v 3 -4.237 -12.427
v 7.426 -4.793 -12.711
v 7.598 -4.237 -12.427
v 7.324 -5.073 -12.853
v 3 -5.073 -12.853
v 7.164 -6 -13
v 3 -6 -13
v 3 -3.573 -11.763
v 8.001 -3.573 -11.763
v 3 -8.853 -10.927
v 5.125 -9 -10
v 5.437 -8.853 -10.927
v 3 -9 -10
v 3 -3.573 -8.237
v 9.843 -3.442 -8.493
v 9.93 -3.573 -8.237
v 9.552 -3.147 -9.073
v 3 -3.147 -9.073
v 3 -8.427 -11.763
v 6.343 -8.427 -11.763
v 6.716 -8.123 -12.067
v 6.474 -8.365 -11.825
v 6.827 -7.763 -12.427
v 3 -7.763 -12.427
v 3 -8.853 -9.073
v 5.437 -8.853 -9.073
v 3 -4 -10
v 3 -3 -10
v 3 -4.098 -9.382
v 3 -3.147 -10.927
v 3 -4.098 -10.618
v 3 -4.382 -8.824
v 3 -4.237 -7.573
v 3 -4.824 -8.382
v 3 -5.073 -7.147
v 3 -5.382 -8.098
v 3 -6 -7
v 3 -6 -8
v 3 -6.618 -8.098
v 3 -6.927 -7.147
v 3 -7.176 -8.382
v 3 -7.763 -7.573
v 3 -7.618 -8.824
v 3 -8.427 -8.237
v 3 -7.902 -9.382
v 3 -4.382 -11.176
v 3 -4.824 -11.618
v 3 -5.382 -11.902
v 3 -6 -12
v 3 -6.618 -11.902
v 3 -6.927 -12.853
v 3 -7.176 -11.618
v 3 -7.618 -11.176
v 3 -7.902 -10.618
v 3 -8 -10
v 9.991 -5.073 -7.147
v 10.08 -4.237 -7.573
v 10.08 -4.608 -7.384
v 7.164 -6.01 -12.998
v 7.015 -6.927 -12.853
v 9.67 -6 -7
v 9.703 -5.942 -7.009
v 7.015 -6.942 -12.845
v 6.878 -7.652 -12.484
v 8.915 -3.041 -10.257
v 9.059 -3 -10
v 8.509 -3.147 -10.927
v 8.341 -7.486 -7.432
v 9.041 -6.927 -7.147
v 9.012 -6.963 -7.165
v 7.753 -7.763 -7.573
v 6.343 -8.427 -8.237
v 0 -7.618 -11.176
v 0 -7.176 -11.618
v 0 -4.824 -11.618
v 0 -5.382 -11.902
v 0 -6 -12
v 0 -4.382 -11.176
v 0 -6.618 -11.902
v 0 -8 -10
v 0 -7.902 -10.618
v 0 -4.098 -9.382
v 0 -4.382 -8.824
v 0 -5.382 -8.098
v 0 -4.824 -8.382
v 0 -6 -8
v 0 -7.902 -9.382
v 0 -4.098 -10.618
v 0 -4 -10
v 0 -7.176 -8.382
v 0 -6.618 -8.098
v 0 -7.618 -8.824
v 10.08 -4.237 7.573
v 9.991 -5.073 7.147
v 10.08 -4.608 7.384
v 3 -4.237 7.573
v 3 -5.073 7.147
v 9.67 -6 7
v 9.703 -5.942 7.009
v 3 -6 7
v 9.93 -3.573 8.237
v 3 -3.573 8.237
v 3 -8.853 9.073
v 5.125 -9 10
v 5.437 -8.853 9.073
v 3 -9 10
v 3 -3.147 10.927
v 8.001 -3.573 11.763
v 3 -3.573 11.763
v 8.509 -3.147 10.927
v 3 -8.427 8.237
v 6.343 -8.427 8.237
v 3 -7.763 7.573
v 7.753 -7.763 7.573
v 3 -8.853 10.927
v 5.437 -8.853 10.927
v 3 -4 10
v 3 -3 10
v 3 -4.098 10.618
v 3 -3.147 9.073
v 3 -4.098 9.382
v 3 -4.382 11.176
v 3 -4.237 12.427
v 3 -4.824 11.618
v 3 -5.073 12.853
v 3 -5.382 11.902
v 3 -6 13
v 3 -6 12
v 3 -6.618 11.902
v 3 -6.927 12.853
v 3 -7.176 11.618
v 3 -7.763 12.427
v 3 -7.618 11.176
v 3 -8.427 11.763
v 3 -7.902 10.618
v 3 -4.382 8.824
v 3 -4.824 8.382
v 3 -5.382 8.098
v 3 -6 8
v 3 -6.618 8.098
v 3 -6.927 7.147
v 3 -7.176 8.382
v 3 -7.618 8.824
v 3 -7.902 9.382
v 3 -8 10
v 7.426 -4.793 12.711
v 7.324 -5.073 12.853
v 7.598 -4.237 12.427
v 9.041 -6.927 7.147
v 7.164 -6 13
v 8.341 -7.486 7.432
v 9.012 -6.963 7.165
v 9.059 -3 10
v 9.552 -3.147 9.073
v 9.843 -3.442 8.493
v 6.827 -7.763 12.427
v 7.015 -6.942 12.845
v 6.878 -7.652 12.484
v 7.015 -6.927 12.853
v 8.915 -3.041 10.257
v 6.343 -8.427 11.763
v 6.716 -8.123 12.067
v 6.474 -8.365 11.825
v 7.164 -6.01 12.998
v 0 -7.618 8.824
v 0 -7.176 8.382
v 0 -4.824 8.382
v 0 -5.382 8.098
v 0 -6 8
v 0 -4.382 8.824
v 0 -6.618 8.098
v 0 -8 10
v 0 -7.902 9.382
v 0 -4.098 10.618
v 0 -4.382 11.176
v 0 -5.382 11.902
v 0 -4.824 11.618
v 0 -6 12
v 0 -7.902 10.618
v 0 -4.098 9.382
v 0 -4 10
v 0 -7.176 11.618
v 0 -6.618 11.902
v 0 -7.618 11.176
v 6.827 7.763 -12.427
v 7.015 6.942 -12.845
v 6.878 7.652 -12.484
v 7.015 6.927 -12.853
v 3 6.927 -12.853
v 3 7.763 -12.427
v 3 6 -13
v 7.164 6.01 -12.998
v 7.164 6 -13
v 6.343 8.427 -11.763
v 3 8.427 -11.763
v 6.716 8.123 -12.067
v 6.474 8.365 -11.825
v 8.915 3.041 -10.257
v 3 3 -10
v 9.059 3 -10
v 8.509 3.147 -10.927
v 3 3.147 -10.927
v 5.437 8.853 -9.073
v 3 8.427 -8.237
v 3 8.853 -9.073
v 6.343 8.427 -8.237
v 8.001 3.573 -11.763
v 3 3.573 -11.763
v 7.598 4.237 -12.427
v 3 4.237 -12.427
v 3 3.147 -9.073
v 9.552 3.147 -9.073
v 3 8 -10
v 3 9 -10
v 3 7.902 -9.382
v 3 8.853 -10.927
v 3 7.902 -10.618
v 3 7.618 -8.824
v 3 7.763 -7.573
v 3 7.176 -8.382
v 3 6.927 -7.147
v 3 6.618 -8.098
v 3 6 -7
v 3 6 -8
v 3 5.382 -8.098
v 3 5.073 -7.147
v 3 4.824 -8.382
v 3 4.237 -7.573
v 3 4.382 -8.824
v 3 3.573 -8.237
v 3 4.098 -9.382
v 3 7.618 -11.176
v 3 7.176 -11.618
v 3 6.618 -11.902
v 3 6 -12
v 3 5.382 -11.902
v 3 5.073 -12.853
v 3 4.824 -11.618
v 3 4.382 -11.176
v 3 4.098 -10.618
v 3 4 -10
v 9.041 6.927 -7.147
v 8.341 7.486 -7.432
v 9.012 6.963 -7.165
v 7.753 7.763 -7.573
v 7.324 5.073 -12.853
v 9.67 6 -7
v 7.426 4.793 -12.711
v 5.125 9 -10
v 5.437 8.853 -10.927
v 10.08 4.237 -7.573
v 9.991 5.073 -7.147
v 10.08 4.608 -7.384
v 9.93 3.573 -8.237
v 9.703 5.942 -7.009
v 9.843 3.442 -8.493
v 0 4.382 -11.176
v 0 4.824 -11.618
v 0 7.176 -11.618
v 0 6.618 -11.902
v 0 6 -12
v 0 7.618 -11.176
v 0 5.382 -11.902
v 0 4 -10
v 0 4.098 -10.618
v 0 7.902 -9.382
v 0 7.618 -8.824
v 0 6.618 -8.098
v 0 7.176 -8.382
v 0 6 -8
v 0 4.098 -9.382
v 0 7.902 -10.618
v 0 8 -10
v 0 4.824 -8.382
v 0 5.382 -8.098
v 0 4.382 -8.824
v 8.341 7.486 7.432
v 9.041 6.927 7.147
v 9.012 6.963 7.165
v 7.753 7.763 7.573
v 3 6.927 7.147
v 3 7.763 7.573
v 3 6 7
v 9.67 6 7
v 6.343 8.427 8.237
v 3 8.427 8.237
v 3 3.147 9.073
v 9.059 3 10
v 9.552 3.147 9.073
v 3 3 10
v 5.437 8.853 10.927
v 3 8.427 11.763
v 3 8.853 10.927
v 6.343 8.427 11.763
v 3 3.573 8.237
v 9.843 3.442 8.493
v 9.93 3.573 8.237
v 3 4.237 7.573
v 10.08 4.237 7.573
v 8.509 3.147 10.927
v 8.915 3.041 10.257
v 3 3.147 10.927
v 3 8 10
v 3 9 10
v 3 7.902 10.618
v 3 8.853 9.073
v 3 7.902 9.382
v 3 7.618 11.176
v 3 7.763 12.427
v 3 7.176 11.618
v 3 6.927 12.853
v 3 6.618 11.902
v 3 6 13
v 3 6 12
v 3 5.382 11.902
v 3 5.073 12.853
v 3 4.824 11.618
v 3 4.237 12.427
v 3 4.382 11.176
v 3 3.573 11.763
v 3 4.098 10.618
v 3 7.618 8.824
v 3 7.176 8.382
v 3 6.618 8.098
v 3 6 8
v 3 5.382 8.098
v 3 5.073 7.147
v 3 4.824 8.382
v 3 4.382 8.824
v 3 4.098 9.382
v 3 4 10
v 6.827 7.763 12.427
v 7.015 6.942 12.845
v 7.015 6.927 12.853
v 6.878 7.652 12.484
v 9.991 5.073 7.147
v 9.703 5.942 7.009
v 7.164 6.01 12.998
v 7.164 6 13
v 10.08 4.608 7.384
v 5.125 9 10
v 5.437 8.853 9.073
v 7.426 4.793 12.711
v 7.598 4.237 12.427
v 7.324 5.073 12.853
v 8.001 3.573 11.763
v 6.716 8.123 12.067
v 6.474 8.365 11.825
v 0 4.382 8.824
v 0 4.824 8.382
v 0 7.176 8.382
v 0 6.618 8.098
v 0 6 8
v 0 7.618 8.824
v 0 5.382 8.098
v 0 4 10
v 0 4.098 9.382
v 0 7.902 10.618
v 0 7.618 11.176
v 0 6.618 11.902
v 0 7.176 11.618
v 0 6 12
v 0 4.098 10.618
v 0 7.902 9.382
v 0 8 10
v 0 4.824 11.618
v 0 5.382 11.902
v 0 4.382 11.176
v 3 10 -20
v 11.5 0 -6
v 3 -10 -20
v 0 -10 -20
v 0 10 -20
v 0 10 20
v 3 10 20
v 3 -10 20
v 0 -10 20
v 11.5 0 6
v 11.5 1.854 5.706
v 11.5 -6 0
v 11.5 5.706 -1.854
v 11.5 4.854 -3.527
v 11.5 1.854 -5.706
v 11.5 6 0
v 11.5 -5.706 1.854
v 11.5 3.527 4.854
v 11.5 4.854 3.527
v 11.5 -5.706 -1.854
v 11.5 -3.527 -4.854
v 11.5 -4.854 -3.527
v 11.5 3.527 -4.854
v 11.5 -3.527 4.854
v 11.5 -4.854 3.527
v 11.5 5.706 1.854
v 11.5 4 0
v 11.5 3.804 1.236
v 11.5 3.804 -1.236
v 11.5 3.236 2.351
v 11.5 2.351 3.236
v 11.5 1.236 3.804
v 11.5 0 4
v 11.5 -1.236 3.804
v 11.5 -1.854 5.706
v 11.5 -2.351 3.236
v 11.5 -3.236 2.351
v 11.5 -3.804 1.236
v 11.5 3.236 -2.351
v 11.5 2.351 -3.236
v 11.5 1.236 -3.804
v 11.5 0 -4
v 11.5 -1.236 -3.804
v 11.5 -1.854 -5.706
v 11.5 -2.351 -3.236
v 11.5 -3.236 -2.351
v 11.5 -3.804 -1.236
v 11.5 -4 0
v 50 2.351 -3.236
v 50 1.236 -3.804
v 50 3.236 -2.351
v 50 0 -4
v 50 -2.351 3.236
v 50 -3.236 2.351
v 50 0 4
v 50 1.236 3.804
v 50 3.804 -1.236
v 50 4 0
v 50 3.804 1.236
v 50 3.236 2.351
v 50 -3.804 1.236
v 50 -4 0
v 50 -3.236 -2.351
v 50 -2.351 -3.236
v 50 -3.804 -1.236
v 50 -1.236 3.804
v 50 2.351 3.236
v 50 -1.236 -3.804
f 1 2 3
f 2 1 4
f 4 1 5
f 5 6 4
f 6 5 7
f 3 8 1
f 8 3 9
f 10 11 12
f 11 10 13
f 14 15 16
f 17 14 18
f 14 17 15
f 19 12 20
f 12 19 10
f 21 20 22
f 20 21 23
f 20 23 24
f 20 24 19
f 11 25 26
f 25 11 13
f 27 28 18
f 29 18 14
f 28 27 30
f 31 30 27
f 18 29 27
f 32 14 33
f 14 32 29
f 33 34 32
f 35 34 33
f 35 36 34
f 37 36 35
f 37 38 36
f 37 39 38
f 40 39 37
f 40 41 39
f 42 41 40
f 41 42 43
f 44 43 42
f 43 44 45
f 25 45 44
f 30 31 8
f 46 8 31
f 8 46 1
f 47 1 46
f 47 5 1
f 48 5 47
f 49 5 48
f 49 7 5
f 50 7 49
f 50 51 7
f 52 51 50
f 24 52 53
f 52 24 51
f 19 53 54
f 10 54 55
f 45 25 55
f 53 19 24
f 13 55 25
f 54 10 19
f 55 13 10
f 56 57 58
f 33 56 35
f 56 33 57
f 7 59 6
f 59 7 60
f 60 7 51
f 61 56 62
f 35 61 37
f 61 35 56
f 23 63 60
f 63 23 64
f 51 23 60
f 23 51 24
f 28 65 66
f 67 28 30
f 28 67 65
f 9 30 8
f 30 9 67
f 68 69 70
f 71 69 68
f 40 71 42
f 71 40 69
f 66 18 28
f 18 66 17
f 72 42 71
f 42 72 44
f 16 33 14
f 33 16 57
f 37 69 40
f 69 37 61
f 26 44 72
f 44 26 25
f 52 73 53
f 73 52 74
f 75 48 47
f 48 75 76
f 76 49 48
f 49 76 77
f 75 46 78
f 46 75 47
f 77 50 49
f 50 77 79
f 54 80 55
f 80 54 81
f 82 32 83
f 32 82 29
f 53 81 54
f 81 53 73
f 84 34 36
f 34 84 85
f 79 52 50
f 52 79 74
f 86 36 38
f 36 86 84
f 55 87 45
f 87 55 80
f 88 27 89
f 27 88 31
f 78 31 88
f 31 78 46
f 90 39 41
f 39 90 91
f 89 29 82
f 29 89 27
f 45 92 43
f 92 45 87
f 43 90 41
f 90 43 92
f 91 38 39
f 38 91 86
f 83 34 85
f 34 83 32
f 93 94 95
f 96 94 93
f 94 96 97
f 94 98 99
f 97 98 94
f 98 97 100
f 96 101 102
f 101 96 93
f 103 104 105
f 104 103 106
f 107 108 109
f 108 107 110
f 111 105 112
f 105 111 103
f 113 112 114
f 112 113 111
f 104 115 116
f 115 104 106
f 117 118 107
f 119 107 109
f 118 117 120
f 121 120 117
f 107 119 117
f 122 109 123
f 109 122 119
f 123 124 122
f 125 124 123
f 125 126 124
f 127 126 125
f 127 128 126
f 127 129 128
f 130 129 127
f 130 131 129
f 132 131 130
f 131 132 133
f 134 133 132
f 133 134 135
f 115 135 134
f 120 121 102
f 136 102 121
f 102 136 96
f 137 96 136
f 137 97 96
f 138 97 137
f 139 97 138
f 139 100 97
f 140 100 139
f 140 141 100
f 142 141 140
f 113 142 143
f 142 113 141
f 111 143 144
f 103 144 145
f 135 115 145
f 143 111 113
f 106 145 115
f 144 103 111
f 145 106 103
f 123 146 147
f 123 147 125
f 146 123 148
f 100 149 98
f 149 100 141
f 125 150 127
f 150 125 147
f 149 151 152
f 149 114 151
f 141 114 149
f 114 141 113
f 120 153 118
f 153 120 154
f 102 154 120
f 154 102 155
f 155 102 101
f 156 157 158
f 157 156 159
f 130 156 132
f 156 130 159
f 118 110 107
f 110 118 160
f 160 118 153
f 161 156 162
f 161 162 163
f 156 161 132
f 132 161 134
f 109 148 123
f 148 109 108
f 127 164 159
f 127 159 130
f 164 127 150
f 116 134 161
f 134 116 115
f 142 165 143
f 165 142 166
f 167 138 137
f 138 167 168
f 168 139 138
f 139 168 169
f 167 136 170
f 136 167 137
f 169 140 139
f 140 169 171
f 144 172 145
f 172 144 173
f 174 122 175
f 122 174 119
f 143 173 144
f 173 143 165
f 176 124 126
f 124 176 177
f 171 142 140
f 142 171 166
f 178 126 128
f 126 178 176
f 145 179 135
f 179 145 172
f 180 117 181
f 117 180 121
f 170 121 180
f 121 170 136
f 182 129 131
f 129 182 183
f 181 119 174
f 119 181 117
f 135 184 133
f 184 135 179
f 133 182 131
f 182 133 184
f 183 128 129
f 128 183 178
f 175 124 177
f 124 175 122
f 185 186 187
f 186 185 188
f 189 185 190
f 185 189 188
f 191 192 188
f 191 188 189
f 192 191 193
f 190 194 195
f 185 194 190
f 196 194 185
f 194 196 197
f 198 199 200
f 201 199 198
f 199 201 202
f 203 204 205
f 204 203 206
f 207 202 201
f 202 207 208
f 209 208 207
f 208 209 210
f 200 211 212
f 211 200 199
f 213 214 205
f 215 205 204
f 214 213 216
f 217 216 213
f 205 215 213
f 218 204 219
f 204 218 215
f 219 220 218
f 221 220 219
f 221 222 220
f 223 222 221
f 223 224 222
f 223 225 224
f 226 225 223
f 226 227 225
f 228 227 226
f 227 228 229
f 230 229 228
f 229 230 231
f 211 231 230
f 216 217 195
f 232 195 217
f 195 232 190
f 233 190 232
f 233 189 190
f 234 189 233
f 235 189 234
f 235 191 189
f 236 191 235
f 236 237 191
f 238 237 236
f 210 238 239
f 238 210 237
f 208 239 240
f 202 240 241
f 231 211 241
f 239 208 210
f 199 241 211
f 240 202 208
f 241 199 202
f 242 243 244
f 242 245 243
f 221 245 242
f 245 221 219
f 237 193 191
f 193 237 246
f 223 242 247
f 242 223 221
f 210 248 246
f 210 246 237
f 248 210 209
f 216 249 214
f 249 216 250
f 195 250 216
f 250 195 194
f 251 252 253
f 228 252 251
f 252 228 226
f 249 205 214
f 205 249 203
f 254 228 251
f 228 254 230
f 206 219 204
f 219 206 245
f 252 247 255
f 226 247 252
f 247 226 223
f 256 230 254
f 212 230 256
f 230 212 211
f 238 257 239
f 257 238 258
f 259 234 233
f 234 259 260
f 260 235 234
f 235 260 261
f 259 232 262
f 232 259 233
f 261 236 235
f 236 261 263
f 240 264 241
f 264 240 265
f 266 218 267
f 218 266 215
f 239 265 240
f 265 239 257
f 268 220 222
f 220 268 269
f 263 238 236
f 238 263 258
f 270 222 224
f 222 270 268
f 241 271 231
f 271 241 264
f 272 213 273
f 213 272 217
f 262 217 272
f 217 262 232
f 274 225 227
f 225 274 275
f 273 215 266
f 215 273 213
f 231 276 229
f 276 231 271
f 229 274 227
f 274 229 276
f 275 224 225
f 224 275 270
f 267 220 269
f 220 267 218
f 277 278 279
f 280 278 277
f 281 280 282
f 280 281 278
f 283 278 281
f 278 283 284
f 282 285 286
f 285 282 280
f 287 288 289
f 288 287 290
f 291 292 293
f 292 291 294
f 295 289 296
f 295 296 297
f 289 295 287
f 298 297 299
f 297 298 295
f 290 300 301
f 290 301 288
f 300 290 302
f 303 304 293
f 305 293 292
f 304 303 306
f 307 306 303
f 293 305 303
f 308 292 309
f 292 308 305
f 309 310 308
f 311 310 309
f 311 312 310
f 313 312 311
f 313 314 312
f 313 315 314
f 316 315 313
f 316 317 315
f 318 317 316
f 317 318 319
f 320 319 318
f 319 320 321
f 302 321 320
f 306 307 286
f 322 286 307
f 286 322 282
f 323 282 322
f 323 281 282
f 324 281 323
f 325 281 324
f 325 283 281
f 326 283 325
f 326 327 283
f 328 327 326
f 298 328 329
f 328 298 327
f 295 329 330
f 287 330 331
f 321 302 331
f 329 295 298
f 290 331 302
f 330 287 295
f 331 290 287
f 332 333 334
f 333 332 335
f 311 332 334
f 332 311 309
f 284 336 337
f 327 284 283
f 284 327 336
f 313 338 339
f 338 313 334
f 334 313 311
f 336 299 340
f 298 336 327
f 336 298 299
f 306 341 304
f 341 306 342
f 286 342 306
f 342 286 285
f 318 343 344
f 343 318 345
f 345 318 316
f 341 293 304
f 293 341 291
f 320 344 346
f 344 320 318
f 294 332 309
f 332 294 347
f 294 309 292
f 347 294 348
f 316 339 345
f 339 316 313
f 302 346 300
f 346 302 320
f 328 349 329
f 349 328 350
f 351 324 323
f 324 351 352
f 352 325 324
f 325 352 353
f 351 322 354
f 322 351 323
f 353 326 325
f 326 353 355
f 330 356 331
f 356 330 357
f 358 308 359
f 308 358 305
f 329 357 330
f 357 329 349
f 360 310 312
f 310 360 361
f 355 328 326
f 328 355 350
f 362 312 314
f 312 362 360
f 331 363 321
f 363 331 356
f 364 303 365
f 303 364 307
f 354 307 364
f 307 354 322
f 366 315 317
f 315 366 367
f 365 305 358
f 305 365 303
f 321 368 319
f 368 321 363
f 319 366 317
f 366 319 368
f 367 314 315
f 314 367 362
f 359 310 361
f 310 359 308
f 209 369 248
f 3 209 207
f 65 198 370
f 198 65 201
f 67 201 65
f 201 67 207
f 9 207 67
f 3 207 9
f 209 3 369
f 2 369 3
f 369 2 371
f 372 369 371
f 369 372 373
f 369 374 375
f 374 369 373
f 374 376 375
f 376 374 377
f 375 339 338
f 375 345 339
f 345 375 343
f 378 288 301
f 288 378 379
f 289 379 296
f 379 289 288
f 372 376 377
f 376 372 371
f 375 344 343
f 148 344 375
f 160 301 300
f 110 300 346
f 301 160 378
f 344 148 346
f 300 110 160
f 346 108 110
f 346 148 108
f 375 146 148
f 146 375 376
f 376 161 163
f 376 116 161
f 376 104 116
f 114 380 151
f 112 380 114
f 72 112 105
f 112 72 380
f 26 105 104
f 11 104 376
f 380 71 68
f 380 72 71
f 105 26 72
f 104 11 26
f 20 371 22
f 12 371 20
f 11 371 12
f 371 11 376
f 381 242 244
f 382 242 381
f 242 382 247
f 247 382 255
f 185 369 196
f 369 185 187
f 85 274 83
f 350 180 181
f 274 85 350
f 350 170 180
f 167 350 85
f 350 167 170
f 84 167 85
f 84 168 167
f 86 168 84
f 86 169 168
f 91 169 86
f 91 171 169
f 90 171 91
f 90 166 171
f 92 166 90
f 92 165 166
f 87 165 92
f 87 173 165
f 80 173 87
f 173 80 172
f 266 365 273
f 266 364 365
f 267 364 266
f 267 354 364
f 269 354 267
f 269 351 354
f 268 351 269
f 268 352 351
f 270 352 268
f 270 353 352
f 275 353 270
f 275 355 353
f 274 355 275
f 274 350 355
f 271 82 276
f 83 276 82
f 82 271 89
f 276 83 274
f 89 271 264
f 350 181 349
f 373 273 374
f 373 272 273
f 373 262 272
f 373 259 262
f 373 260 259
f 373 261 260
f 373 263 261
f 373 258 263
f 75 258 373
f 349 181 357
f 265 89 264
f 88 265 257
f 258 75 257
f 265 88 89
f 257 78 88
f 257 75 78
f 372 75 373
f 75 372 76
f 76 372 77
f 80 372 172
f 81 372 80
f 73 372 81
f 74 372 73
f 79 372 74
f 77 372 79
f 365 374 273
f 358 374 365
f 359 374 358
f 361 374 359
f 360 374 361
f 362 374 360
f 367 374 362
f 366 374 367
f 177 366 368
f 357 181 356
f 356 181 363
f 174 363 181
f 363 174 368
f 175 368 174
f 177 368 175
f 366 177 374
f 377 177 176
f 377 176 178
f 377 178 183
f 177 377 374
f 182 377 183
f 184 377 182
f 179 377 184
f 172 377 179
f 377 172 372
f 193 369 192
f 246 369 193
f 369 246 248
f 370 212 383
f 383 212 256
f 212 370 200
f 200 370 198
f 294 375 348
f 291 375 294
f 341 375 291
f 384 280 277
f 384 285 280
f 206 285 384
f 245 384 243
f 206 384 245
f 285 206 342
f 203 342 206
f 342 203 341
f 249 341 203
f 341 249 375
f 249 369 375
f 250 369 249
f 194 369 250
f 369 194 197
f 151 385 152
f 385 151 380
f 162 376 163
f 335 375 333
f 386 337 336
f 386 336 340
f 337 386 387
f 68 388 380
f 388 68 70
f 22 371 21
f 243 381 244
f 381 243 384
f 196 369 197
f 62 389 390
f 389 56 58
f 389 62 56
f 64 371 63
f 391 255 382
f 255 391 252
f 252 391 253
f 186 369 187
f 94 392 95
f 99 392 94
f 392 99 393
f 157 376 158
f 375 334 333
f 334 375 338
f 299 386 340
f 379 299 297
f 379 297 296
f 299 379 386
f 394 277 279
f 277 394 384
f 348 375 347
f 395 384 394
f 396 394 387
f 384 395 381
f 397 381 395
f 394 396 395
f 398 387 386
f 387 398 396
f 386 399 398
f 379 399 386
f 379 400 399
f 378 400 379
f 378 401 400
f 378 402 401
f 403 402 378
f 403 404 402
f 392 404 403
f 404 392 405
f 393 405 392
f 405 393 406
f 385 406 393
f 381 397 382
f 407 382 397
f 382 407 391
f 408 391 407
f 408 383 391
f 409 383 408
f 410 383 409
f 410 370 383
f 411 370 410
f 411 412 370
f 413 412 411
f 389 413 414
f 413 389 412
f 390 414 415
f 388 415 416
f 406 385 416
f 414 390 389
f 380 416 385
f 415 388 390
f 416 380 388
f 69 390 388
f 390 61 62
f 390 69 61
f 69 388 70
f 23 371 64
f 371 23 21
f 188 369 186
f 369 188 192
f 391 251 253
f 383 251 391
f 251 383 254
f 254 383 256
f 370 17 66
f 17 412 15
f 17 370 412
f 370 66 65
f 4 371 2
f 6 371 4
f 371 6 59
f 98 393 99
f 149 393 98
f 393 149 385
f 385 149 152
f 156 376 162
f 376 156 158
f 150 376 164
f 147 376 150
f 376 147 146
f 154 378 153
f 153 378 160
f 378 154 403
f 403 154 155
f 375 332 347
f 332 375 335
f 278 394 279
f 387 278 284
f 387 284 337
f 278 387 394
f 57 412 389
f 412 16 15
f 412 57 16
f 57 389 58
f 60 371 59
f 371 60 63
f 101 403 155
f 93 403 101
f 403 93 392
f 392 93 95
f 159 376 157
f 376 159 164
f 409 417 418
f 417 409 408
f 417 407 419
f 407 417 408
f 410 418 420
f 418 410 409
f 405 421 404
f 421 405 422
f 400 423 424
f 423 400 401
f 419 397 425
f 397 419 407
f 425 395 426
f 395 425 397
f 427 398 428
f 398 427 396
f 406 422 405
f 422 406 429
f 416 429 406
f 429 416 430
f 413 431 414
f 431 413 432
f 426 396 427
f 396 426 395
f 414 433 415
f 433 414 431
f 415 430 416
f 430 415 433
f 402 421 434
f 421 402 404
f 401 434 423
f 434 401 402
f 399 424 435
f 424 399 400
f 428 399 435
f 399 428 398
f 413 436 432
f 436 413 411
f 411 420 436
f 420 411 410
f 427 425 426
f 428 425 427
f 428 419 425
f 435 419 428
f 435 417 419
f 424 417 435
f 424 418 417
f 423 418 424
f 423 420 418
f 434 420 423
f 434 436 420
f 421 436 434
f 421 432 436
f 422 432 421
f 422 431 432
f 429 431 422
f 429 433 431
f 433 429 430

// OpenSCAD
// file: Library/20x40.scad
module 20x40(L = 50, center = false, massive = false) {
color("silver")
if (center == true)
{
	if (massive == true) {
		cube (size = [L, 20, 40], center = true);
	} else { 
		rotate([90, 0, 90]) {
			linear_extrude(height = L, center = center, convexity = 10)
			import (file = "HFSB5-2040-50_view1_AUTOCAD_VERSION_2013.dxf");
		}
	}
} else {
	if (massive == true) {
		translate ([0, -10, 0]) cube (size = [L, 20, 40], center = false);
	} else {
		translate([0,0,20]) rotate([90, 0, 90]) {
			linear_extrude(height = L, center = center, convexity = 10)
			import (file = "HFSB5-2040-50_view1_AUTOCAD_VERSION_2013.dxf");
		}
	}
}
}

20x40(center = true, massive = false);
// main file
use <Library/20x40.scad>
$fn=20;

module demo_render(demo_length = 50)
{
    translate([-10,-20,0])
    {
        translate([demo_length/2+10,0,0])
            20x40(center=true, L=demo_length);
        translate([0,demo_length/2-10,0])
            rotate([0,0,90])
            20x40(center=true, L=demo_length);
        color("gray")
        translate([10,20,0])
            rotate([0,90,0])
            cylinder(r=8/2, h=demo_length);
    }
}

module smooth_holder()
{
    translate([3/2,0,0])
    difference()
    {
        hull()
        {
            rotate([0,90,0])
                cylinder(r=12/2, h=10);
            cube([3, 20, 40], center=true);
        }
        rotate([0,90,0])
            cylinder(r=8/2, h=22, center=true);
        for(i=[-1,1])
        for(j=[-1,1])
            translate([3/2,0,0])
            translate([0,6*i,0])
            translate([0,0,10*j])
            rotate([0,90,0])
            {
                cylinder(r=6/2, h=10);
                cylinder(r=4/2, h=22, center=true);

            }
    }
}

smooth_holder();
demo_render();
